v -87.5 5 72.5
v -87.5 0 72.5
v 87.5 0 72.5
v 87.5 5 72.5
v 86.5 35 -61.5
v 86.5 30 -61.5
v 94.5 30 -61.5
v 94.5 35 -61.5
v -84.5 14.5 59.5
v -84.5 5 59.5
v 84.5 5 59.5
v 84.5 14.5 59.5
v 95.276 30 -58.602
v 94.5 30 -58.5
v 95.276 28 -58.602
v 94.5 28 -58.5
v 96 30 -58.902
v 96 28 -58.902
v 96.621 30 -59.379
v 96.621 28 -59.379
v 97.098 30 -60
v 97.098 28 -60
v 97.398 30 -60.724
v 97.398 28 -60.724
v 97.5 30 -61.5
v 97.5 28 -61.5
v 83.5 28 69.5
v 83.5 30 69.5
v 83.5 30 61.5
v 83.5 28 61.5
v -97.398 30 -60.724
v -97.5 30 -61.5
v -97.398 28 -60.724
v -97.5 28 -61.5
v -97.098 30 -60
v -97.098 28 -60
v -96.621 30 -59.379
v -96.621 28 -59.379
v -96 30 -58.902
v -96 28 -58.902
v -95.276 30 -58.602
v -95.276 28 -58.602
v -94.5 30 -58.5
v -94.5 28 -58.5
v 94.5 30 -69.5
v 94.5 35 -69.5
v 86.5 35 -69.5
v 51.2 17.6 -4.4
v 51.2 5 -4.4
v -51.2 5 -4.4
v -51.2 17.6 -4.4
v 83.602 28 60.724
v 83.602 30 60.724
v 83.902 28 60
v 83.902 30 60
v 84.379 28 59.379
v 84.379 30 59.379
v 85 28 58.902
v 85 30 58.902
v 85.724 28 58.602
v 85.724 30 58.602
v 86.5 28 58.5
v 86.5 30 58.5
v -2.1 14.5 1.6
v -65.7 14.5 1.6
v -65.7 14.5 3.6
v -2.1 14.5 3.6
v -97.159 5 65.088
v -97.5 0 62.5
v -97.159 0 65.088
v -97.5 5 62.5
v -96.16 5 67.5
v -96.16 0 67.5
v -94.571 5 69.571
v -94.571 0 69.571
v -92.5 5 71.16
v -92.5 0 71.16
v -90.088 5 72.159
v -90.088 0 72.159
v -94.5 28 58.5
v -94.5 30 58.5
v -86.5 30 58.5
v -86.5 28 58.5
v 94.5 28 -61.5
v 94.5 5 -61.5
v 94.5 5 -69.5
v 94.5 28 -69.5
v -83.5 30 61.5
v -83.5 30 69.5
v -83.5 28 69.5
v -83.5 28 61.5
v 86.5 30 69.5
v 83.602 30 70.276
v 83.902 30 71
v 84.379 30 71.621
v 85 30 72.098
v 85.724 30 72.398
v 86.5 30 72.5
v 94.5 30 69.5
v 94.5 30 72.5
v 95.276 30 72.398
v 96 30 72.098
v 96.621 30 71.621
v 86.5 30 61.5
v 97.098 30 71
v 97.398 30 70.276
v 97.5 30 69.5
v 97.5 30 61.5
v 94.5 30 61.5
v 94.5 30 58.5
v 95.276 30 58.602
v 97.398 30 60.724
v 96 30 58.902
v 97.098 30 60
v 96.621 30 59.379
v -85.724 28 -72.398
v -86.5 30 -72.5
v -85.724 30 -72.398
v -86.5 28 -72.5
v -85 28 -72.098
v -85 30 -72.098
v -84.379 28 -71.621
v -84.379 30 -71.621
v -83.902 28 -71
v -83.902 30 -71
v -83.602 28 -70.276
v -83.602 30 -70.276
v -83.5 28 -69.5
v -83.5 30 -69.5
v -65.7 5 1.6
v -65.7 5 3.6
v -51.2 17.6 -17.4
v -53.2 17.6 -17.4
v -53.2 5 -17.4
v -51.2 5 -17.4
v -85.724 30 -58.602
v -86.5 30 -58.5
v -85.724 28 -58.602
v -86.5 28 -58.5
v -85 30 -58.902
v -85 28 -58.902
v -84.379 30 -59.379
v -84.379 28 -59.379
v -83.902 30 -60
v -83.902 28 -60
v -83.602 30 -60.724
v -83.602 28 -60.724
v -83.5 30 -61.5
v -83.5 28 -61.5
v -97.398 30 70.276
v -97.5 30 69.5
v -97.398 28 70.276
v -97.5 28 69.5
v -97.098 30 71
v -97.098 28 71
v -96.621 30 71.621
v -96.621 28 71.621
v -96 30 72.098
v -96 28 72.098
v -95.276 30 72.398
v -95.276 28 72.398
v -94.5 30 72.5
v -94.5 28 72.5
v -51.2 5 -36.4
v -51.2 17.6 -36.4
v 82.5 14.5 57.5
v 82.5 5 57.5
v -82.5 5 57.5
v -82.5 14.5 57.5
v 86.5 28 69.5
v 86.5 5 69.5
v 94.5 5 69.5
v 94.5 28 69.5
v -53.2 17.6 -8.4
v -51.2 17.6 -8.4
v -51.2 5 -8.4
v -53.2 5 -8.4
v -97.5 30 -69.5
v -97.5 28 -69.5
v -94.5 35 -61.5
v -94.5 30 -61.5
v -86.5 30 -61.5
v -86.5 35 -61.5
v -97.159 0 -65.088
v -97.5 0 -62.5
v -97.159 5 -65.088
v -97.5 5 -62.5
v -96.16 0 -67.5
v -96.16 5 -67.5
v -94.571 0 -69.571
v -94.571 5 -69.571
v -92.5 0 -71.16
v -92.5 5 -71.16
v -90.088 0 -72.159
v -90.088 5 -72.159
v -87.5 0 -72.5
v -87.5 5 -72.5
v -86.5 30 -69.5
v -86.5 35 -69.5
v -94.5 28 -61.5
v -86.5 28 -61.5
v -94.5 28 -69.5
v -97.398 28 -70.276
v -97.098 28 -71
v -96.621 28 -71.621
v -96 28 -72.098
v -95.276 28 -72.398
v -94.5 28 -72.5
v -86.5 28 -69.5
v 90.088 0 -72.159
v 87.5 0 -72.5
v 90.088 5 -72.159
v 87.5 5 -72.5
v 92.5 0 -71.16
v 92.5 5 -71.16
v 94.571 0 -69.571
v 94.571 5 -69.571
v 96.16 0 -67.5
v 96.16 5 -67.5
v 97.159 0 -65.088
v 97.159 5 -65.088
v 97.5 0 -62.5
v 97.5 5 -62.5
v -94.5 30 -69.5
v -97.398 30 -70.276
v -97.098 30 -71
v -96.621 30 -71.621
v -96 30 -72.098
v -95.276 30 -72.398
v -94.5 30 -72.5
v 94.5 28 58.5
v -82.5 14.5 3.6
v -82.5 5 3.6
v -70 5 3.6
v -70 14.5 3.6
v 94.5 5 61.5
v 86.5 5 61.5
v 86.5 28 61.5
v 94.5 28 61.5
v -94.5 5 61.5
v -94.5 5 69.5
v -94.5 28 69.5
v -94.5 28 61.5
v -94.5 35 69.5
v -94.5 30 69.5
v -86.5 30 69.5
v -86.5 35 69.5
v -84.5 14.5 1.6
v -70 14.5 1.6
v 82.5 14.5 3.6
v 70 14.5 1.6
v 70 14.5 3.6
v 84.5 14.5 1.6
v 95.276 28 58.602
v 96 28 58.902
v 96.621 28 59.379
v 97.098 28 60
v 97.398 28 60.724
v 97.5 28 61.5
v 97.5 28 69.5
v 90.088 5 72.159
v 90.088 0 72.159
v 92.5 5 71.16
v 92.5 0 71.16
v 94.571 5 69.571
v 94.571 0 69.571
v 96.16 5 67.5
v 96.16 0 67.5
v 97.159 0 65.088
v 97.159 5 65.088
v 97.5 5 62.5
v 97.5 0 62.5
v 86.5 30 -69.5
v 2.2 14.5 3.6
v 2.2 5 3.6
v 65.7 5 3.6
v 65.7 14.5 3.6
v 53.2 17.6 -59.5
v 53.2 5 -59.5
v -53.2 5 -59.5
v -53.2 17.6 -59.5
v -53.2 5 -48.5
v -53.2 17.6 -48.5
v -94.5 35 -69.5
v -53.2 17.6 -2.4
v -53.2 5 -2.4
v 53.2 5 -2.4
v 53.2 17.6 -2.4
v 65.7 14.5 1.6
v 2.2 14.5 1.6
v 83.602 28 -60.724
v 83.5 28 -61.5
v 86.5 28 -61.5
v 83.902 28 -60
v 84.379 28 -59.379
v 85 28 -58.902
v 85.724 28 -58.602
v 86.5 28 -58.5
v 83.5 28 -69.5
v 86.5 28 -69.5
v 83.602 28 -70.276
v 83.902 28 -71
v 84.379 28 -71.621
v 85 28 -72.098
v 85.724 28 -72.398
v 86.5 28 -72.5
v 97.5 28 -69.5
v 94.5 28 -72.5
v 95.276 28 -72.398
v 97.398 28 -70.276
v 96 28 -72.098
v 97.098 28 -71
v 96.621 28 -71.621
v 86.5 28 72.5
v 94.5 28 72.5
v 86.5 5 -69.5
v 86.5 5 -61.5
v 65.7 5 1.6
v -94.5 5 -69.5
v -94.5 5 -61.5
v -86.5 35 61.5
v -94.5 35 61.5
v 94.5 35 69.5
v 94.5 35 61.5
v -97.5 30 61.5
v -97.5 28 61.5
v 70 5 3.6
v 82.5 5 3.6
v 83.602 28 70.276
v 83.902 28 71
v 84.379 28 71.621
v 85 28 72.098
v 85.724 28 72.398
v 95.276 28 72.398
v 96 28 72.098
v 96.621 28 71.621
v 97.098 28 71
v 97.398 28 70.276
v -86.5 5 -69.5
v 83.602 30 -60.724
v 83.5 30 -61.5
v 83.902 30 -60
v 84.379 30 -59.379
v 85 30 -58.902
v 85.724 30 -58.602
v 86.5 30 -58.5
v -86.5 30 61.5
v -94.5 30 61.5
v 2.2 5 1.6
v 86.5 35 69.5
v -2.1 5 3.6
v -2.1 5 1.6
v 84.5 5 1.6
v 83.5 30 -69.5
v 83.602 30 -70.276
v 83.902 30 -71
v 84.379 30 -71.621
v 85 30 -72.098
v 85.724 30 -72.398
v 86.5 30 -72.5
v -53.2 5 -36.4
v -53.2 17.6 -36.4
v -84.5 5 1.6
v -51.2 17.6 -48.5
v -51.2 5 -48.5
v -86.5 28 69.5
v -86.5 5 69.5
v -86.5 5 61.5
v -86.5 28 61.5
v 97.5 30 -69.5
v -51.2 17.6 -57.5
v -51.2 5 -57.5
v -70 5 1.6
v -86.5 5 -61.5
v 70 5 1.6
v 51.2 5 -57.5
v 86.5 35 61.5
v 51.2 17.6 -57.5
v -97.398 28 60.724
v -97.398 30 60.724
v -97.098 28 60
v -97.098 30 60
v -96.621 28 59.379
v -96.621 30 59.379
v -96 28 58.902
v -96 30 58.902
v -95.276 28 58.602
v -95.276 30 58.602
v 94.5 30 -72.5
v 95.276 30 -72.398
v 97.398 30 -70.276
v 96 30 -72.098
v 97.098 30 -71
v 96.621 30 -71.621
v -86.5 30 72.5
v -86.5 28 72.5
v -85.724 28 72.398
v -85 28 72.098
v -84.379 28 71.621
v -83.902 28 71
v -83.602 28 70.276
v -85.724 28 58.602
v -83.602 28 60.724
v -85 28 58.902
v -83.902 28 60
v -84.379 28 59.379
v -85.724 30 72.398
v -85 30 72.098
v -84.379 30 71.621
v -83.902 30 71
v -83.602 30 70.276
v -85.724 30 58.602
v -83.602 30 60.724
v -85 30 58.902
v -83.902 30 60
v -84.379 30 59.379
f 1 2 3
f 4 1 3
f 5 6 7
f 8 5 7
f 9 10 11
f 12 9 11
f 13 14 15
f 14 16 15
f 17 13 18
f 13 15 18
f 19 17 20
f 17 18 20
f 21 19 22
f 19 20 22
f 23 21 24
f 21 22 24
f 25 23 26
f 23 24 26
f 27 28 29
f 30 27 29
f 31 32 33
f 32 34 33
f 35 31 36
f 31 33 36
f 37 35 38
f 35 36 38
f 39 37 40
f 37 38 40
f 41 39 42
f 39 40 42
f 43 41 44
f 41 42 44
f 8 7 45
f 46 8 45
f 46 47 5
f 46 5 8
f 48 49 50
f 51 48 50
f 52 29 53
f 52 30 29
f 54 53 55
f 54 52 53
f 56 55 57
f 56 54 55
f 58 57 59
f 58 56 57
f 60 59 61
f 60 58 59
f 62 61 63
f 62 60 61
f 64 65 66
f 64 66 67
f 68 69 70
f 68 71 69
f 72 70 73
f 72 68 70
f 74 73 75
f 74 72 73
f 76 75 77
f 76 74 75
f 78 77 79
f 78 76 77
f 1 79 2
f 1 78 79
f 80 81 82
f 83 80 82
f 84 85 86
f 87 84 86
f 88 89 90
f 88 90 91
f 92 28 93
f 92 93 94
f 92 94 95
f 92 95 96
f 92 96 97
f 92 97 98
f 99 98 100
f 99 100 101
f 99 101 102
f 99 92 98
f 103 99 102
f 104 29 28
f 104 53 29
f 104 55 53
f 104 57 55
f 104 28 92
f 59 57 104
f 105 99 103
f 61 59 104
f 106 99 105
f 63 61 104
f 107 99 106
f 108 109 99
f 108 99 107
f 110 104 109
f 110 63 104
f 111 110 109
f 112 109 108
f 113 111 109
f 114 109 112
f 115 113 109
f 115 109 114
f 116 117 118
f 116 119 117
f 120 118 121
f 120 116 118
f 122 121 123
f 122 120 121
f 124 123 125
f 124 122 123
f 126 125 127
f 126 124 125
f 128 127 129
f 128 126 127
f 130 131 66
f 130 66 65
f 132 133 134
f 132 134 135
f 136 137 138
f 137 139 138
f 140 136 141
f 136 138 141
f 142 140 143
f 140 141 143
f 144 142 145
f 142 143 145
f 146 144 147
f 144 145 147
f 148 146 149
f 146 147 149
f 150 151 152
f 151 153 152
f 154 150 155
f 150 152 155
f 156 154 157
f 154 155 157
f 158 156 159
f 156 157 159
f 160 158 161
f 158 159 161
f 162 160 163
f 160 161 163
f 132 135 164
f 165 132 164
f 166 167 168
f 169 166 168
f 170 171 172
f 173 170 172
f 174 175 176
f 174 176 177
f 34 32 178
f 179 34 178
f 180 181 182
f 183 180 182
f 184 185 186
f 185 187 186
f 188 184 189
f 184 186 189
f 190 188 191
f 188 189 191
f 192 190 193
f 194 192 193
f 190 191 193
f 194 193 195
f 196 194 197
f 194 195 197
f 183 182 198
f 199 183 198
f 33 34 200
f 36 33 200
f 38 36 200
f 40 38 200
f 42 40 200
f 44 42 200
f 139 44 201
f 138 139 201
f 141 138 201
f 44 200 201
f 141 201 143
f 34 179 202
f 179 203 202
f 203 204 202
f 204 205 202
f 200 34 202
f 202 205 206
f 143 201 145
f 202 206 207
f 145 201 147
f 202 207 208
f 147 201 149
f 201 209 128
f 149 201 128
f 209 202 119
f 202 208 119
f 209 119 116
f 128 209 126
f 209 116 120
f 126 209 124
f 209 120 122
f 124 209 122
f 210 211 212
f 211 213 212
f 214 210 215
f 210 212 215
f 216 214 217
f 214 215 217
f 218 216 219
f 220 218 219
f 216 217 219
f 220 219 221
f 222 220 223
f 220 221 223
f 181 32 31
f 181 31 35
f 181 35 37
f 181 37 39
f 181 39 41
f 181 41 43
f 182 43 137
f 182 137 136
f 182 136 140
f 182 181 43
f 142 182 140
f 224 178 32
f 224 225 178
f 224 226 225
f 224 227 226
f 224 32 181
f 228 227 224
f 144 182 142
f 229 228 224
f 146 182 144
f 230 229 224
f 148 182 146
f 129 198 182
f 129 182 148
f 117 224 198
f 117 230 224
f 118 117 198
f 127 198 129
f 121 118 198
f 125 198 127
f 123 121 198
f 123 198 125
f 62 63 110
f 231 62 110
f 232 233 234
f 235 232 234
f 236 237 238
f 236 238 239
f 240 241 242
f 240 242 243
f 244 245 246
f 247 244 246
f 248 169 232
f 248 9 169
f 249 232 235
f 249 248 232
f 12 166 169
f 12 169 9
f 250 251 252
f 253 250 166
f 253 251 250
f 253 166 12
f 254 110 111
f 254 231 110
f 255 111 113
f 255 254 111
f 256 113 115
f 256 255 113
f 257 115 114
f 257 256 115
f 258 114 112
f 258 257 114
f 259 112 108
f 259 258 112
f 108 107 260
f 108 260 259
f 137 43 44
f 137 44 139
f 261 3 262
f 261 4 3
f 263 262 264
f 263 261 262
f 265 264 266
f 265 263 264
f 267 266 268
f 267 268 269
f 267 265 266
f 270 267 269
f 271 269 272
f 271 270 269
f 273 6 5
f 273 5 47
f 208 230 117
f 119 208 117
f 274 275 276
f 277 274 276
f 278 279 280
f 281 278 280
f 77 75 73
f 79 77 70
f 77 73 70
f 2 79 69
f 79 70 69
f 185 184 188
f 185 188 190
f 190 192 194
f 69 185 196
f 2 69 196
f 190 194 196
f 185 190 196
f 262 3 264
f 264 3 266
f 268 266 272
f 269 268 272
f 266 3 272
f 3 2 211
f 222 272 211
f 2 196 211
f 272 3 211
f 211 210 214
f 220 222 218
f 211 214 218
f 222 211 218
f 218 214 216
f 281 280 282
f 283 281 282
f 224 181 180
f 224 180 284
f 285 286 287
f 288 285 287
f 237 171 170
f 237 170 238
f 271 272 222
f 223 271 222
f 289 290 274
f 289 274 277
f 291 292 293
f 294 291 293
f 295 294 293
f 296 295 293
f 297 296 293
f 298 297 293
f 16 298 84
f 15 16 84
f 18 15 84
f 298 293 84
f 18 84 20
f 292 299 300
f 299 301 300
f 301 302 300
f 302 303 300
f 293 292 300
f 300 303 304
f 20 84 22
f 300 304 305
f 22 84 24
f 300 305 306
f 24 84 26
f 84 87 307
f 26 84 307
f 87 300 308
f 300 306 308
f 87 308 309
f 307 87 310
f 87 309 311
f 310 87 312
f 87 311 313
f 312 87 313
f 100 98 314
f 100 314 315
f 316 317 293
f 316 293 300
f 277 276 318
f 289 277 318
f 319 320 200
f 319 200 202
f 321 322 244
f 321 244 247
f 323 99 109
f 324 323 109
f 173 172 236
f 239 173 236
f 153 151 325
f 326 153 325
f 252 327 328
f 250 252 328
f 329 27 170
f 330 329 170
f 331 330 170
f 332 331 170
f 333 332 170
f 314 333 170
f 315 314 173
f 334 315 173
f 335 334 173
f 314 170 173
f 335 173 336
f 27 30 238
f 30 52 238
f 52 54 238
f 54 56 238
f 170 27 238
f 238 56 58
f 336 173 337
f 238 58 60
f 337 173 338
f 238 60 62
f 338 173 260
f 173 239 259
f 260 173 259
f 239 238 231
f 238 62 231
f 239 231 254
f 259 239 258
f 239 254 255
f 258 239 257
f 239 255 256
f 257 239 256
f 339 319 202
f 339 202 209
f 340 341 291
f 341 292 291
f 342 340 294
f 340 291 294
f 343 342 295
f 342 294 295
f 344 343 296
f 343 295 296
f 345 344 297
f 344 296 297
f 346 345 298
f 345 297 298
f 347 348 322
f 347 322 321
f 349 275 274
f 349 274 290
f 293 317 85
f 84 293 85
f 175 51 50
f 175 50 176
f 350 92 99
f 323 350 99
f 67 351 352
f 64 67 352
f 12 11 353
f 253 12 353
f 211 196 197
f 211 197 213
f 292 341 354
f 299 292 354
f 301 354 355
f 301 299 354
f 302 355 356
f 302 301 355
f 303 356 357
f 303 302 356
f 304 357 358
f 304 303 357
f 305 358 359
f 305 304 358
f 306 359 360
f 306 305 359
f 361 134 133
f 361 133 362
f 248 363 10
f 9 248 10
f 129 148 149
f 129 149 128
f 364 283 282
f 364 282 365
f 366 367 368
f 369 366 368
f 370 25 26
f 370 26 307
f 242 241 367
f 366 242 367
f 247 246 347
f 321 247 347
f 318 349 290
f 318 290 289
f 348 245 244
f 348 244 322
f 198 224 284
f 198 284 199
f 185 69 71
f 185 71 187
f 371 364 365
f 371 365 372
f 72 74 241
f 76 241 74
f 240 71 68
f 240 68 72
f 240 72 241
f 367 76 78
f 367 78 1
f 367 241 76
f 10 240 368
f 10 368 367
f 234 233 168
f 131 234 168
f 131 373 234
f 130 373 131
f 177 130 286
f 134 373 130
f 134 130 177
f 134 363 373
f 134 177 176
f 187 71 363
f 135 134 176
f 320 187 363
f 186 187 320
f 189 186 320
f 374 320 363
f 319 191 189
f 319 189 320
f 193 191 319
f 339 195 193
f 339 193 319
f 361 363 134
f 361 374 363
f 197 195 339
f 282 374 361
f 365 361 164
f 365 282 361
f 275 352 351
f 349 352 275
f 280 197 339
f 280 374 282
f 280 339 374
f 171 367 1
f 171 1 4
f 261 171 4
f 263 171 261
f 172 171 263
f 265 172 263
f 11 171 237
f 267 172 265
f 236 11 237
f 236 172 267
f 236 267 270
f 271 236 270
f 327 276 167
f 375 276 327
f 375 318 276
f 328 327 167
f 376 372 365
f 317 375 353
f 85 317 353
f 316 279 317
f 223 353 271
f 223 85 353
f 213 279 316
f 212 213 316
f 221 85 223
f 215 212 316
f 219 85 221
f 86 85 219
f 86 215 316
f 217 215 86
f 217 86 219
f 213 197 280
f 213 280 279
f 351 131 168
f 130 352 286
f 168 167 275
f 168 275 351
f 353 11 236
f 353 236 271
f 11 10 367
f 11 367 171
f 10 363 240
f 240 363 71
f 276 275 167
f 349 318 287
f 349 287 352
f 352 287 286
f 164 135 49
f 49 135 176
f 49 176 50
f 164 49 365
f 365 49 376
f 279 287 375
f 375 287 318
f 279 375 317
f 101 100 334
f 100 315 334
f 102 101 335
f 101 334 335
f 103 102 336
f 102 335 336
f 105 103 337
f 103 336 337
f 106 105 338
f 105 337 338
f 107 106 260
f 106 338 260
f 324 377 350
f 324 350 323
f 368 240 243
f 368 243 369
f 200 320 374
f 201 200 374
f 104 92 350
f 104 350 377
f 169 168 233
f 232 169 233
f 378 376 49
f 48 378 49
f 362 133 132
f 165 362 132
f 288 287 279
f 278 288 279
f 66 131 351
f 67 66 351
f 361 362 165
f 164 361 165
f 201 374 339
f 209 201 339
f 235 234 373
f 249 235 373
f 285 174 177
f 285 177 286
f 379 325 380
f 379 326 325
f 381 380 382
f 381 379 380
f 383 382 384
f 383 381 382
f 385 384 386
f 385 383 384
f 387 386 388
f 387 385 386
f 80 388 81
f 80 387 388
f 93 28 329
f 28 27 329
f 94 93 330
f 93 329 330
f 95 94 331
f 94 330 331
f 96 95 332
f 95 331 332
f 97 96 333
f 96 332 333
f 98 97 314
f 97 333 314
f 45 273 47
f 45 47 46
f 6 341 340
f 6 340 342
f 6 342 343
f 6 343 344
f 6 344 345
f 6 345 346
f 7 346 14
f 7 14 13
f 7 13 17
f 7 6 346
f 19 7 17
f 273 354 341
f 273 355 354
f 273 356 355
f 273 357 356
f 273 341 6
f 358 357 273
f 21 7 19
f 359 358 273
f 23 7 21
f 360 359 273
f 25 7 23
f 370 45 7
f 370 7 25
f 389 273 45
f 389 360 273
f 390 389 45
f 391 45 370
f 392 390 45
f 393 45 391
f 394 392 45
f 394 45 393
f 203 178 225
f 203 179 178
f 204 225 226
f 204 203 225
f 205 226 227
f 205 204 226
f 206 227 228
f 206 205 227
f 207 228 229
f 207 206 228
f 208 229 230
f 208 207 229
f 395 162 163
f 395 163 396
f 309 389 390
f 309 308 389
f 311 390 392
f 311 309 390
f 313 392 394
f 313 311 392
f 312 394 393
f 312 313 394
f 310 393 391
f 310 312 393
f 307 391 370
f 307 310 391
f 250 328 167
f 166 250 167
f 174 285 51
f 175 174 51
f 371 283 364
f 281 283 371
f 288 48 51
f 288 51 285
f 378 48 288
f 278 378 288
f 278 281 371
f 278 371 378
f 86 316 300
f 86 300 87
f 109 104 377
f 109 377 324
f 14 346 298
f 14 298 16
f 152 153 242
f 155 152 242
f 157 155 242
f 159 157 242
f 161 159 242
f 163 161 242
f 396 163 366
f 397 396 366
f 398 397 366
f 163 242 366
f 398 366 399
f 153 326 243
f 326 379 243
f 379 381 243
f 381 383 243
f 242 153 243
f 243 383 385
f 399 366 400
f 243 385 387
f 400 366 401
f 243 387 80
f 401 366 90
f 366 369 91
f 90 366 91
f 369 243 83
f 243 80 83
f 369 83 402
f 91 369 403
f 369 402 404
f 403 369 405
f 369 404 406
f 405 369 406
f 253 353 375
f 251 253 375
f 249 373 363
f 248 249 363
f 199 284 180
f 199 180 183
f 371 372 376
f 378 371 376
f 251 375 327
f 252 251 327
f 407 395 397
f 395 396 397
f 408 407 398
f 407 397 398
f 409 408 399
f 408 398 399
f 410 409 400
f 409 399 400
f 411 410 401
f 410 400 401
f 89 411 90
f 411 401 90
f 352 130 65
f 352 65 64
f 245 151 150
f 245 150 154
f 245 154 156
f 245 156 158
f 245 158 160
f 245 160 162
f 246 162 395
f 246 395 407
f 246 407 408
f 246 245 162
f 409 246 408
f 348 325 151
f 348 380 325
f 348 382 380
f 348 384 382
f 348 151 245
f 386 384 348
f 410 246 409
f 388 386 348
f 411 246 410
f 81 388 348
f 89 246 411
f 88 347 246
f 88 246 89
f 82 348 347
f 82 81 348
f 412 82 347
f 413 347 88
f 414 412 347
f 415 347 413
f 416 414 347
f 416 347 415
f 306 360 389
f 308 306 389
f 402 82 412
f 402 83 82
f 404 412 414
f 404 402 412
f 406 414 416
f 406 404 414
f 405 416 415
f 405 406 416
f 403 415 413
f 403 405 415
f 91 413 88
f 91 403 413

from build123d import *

# Parameters (mm, degrees)
SKETCH1_W            = 195
SKETCH1_H            = 145
BOSS_EXTRUDE1_DEPTH  = 5
SKETCH2_W            = 63.6
SKETCH2_H            = 2
SKETCH2_W_2          = 63.5
BOSS_EXTRUDE2_DEPTH  = 9.5
SKETCH4_W            = 8
SKETCH4_H            = 8
BOSS_EXTRUDE3_DEPTH  = 30
SKETCH3_W            = 2
SKETCH3_H            = 19
BOSS_EXTRUDE11_DEPTH = 12.6
SKETCH8_W            = 14
SKETCH8_H            = 14
SKETCH8_W_2          = 8
SKETCH8_H_2          = 8
BOSS_EXTRUDE12_DEPTH = 2
FILLET2_R            = 10
FILLET3_R            = 3


with BuildPart() as part:
    # Sketch1 → Boss-Extrude1 (new body)
    with BuildSketch(Plane(origin=(0, 0, 0), x_dir=(1, 0, 0), z_dir=(0, 1, 0))):
        Rectangle(SKETCH1_W, SKETCH1_H)
    extrude(amount=BOSS_EXTRUDE1_DEPTH)

    # Sketch2 → Boss-Extrude2 (add)
    with BuildSketch(Plane(origin=(0, 5, 0), x_dir=(1, 0, 0), z_dir=(0, 1, 0))):
        Polygon((-82.5, -57.5), (-82.5, -3.6), (-70, -3.6), (-70, -1.6), (-84.5, -1.6), (-84.5, -59.5), (84.5, -59.5), (84.5, -1.6), (70, -1.6), (70, -3.6), (82.5, -3.6), (82.5, -57.5), align=None)
        with Locations((-33.9, -2.6)):
            Rectangle(SKETCH2_W, SKETCH2_H)
        with Locations((33.95, -2.6)):
            Rectangle(SKETCH2_W_2, SKETCH2_H)
    extrude(amount=BOSS_EXTRUDE2_DEPTH)

    # Sketch4 → Boss-Extrude3 (add)
    with BuildSketch(Plane(origin=(0, 5, 0), x_dir=(1, 0, 0), z_dir=(0, 1, 0))):
        with Locations((-90.5, -65.5)):
            Rectangle(SKETCH4_W, SKETCH4_H)
        with Locations((90.5, -65.5)):
            Rectangle(SKETCH4_W, SKETCH4_H)
        with Locations((90.5, 65.5)):
            Rectangle(SKETCH4_W, SKETCH4_H)
        with Locations((-90.5, 65.5)):
            Rectangle(SKETCH4_W, SKETCH4_H)
    extrude(amount=BOSS_EXTRUDE3_DEPTH)

    # Sketch3 → Boss-Extrude11 (add)
    with BuildSketch(Plane(origin=(0, 5, 0), x_dir=(1, 0, 0), z_dir=(0, 1, 0))):
        with Locations((-52.2, 26.9)):
            Rectangle(SKETCH3_W, SKETCH3_H)
        Polygon((-51.2, 48.5), (-51.2, 57.5), (51.2, 57.5), (51.2, 4.4), (-51.2, 4.4), (-51.2, 8.4), (-53.2, 8.4), (-53.2, 2.4), (53.2, 2.4), (53.2, 59.5), (-53.2, 59.5), (-53.2, 48.5), align=None)
    extrude(amount=BOSS_EXTRUDE11_DEPTH)

    # Sketch8 → Boss-Extrude12 (add)
    with BuildSketch(Plane(origin=(0, 30, 0), x_dir=(1, 0, 0), z_dir=(0, 1, 0))):
        with Locations((90.5, 65.5)):
            Rectangle(SKETCH8_W, SKETCH8_H)
        with Locations((90.5, 65.5)):
            Rectangle(SKETCH8_W_2, SKETCH8_H_2, mode=Mode.SUBTRACT)
        with Locations((90.5, -65.5)):
            Rectangle(SKETCH8_W, SKETCH8_H)
        with Locations((90.5, -65.5)):
            Rectangle(SKETCH8_W_2, SKETCH8_H_2, mode=Mode.SUBTRACT)
        with Locations((-90.5, -65.5)):
            Rectangle(SKETCH8_W, SKETCH8_H)
        with Locations((-90.5, -65.5)):
            Rectangle(SKETCH8_W_2, SKETCH8_H_2, mode=Mode.SUBTRACT)
        with Locations((-90.5, 65.5)):
            Rectangle(SKETCH8_W, SKETCH8_H)
        with Locations((-90.5, 65.5)):
            Rectangle(SKETCH8_W_2, SKETCH8_H_2, mode=Mode.SUBTRACT)
    extrude(amount=-BOSS_EXTRUDE12_DEPTH)

    # Fillet2
    fillet2_edges = [part.edges().sort_by_distance(p)[0] for p in [
        (-97.5, 2.5, -72.5),
        (97.5, 2.5, -72.5),
        (97.5, 2.5, 72.5),
        (-97.5, 2.5, 72.5),
    ]]
    fillet(fillet2_edges, radius=FILLET2_R)

    # Fillet3
    fillet3_edges = [part.edges().sort_by_distance(p)[0] for p in [
        (97.5, 29, -58.5),
        (83.5, 29, -58.5),
        (83.5, 29, -72.5),
        (97.5, 29, -72.5),
        (83.5, 29, 58.5),
        (97.5, 29, 58.5),
        (97.5, 29, 72.5),
        (83.5, 29, 72.5),
        (-97.5, 29, 58.5),
        (-83.5, 29, 58.5),
        (-83.5, 29, 72.5),
        (-97.5, 29, 72.5),
        (-83.5, 29, -58.5),
        (-97.5, 29, -58.5),
        (-97.5, 29, -72.5),
        (-83.5, 29, -72.5),
    ]]
    fillet(fillet3_edges, radius=FILLET3_R)


solid = part.part
